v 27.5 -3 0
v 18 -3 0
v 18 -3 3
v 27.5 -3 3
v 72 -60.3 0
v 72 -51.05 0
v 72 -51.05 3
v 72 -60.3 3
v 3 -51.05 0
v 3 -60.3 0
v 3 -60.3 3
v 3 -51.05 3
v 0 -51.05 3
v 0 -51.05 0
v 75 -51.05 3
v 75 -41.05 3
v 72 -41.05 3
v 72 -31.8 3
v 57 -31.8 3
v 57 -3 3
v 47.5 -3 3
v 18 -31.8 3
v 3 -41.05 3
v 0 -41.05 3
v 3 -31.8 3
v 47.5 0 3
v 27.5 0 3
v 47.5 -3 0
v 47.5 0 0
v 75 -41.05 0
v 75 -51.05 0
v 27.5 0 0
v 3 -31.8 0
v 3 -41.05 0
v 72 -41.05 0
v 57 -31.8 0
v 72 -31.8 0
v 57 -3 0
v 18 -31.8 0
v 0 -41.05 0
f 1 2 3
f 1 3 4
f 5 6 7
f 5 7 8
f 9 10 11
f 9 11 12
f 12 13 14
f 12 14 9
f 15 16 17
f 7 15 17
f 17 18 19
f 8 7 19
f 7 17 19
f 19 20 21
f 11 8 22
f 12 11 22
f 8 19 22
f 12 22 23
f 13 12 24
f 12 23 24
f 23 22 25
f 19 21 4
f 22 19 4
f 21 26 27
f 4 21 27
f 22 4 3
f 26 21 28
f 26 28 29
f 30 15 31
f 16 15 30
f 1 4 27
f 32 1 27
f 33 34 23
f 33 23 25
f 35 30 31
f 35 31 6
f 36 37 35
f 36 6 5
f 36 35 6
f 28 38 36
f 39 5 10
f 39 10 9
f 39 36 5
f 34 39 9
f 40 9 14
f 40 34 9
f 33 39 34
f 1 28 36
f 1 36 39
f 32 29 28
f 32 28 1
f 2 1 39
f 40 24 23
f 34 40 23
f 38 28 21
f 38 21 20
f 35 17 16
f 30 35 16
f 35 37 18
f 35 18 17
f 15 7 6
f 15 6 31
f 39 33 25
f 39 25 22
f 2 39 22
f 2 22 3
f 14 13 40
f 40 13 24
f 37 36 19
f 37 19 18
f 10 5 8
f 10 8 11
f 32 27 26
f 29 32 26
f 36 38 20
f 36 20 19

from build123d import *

# Parameters (mm, degrees)
SALIENTE_EXTRUIR1_DEPTH = 3
CROQUIS2_W              = 3
CROQUIS2_H              = 10
CROQUIS2_W_2            = 20
CROQUIS2_H_2            = 3
SALIENTE_EXTRUIR2_DEPTH = 3


with BuildPart() as part:
    # Croquis1 → Saliente-Extruir1 (new body)
    with BuildSketch(Plane.XY):
        Polygon((18, -3), (57, -3), (57, -31.8), (72, -31.8), (72, -60.3), (3, -60.3), (3, -31.8), (18, -31.8), align=None)
    extrude(amount=SALIENTE_EXTRUIR1_DEPTH)

    # Croquis2 → Saliente-Extruir2 (add)
    with BuildSketch(Plane.XY.offset(3)):
        with Locations((73.5, -46.05)):
            Rectangle(CROQUIS2_W, CROQUIS2_H)
        with Locations((1.5, -46.05)):
            Rectangle(CROQUIS2_W, CROQUIS2_H)
        with Locations((37.5, -1.5)):
            Rectangle(CROQUIS2_W_2, CROQUIS2_H_2)
    extrude(amount=-SALIENTE_EXTRUIR2_DEPTH)


solid = part.part
